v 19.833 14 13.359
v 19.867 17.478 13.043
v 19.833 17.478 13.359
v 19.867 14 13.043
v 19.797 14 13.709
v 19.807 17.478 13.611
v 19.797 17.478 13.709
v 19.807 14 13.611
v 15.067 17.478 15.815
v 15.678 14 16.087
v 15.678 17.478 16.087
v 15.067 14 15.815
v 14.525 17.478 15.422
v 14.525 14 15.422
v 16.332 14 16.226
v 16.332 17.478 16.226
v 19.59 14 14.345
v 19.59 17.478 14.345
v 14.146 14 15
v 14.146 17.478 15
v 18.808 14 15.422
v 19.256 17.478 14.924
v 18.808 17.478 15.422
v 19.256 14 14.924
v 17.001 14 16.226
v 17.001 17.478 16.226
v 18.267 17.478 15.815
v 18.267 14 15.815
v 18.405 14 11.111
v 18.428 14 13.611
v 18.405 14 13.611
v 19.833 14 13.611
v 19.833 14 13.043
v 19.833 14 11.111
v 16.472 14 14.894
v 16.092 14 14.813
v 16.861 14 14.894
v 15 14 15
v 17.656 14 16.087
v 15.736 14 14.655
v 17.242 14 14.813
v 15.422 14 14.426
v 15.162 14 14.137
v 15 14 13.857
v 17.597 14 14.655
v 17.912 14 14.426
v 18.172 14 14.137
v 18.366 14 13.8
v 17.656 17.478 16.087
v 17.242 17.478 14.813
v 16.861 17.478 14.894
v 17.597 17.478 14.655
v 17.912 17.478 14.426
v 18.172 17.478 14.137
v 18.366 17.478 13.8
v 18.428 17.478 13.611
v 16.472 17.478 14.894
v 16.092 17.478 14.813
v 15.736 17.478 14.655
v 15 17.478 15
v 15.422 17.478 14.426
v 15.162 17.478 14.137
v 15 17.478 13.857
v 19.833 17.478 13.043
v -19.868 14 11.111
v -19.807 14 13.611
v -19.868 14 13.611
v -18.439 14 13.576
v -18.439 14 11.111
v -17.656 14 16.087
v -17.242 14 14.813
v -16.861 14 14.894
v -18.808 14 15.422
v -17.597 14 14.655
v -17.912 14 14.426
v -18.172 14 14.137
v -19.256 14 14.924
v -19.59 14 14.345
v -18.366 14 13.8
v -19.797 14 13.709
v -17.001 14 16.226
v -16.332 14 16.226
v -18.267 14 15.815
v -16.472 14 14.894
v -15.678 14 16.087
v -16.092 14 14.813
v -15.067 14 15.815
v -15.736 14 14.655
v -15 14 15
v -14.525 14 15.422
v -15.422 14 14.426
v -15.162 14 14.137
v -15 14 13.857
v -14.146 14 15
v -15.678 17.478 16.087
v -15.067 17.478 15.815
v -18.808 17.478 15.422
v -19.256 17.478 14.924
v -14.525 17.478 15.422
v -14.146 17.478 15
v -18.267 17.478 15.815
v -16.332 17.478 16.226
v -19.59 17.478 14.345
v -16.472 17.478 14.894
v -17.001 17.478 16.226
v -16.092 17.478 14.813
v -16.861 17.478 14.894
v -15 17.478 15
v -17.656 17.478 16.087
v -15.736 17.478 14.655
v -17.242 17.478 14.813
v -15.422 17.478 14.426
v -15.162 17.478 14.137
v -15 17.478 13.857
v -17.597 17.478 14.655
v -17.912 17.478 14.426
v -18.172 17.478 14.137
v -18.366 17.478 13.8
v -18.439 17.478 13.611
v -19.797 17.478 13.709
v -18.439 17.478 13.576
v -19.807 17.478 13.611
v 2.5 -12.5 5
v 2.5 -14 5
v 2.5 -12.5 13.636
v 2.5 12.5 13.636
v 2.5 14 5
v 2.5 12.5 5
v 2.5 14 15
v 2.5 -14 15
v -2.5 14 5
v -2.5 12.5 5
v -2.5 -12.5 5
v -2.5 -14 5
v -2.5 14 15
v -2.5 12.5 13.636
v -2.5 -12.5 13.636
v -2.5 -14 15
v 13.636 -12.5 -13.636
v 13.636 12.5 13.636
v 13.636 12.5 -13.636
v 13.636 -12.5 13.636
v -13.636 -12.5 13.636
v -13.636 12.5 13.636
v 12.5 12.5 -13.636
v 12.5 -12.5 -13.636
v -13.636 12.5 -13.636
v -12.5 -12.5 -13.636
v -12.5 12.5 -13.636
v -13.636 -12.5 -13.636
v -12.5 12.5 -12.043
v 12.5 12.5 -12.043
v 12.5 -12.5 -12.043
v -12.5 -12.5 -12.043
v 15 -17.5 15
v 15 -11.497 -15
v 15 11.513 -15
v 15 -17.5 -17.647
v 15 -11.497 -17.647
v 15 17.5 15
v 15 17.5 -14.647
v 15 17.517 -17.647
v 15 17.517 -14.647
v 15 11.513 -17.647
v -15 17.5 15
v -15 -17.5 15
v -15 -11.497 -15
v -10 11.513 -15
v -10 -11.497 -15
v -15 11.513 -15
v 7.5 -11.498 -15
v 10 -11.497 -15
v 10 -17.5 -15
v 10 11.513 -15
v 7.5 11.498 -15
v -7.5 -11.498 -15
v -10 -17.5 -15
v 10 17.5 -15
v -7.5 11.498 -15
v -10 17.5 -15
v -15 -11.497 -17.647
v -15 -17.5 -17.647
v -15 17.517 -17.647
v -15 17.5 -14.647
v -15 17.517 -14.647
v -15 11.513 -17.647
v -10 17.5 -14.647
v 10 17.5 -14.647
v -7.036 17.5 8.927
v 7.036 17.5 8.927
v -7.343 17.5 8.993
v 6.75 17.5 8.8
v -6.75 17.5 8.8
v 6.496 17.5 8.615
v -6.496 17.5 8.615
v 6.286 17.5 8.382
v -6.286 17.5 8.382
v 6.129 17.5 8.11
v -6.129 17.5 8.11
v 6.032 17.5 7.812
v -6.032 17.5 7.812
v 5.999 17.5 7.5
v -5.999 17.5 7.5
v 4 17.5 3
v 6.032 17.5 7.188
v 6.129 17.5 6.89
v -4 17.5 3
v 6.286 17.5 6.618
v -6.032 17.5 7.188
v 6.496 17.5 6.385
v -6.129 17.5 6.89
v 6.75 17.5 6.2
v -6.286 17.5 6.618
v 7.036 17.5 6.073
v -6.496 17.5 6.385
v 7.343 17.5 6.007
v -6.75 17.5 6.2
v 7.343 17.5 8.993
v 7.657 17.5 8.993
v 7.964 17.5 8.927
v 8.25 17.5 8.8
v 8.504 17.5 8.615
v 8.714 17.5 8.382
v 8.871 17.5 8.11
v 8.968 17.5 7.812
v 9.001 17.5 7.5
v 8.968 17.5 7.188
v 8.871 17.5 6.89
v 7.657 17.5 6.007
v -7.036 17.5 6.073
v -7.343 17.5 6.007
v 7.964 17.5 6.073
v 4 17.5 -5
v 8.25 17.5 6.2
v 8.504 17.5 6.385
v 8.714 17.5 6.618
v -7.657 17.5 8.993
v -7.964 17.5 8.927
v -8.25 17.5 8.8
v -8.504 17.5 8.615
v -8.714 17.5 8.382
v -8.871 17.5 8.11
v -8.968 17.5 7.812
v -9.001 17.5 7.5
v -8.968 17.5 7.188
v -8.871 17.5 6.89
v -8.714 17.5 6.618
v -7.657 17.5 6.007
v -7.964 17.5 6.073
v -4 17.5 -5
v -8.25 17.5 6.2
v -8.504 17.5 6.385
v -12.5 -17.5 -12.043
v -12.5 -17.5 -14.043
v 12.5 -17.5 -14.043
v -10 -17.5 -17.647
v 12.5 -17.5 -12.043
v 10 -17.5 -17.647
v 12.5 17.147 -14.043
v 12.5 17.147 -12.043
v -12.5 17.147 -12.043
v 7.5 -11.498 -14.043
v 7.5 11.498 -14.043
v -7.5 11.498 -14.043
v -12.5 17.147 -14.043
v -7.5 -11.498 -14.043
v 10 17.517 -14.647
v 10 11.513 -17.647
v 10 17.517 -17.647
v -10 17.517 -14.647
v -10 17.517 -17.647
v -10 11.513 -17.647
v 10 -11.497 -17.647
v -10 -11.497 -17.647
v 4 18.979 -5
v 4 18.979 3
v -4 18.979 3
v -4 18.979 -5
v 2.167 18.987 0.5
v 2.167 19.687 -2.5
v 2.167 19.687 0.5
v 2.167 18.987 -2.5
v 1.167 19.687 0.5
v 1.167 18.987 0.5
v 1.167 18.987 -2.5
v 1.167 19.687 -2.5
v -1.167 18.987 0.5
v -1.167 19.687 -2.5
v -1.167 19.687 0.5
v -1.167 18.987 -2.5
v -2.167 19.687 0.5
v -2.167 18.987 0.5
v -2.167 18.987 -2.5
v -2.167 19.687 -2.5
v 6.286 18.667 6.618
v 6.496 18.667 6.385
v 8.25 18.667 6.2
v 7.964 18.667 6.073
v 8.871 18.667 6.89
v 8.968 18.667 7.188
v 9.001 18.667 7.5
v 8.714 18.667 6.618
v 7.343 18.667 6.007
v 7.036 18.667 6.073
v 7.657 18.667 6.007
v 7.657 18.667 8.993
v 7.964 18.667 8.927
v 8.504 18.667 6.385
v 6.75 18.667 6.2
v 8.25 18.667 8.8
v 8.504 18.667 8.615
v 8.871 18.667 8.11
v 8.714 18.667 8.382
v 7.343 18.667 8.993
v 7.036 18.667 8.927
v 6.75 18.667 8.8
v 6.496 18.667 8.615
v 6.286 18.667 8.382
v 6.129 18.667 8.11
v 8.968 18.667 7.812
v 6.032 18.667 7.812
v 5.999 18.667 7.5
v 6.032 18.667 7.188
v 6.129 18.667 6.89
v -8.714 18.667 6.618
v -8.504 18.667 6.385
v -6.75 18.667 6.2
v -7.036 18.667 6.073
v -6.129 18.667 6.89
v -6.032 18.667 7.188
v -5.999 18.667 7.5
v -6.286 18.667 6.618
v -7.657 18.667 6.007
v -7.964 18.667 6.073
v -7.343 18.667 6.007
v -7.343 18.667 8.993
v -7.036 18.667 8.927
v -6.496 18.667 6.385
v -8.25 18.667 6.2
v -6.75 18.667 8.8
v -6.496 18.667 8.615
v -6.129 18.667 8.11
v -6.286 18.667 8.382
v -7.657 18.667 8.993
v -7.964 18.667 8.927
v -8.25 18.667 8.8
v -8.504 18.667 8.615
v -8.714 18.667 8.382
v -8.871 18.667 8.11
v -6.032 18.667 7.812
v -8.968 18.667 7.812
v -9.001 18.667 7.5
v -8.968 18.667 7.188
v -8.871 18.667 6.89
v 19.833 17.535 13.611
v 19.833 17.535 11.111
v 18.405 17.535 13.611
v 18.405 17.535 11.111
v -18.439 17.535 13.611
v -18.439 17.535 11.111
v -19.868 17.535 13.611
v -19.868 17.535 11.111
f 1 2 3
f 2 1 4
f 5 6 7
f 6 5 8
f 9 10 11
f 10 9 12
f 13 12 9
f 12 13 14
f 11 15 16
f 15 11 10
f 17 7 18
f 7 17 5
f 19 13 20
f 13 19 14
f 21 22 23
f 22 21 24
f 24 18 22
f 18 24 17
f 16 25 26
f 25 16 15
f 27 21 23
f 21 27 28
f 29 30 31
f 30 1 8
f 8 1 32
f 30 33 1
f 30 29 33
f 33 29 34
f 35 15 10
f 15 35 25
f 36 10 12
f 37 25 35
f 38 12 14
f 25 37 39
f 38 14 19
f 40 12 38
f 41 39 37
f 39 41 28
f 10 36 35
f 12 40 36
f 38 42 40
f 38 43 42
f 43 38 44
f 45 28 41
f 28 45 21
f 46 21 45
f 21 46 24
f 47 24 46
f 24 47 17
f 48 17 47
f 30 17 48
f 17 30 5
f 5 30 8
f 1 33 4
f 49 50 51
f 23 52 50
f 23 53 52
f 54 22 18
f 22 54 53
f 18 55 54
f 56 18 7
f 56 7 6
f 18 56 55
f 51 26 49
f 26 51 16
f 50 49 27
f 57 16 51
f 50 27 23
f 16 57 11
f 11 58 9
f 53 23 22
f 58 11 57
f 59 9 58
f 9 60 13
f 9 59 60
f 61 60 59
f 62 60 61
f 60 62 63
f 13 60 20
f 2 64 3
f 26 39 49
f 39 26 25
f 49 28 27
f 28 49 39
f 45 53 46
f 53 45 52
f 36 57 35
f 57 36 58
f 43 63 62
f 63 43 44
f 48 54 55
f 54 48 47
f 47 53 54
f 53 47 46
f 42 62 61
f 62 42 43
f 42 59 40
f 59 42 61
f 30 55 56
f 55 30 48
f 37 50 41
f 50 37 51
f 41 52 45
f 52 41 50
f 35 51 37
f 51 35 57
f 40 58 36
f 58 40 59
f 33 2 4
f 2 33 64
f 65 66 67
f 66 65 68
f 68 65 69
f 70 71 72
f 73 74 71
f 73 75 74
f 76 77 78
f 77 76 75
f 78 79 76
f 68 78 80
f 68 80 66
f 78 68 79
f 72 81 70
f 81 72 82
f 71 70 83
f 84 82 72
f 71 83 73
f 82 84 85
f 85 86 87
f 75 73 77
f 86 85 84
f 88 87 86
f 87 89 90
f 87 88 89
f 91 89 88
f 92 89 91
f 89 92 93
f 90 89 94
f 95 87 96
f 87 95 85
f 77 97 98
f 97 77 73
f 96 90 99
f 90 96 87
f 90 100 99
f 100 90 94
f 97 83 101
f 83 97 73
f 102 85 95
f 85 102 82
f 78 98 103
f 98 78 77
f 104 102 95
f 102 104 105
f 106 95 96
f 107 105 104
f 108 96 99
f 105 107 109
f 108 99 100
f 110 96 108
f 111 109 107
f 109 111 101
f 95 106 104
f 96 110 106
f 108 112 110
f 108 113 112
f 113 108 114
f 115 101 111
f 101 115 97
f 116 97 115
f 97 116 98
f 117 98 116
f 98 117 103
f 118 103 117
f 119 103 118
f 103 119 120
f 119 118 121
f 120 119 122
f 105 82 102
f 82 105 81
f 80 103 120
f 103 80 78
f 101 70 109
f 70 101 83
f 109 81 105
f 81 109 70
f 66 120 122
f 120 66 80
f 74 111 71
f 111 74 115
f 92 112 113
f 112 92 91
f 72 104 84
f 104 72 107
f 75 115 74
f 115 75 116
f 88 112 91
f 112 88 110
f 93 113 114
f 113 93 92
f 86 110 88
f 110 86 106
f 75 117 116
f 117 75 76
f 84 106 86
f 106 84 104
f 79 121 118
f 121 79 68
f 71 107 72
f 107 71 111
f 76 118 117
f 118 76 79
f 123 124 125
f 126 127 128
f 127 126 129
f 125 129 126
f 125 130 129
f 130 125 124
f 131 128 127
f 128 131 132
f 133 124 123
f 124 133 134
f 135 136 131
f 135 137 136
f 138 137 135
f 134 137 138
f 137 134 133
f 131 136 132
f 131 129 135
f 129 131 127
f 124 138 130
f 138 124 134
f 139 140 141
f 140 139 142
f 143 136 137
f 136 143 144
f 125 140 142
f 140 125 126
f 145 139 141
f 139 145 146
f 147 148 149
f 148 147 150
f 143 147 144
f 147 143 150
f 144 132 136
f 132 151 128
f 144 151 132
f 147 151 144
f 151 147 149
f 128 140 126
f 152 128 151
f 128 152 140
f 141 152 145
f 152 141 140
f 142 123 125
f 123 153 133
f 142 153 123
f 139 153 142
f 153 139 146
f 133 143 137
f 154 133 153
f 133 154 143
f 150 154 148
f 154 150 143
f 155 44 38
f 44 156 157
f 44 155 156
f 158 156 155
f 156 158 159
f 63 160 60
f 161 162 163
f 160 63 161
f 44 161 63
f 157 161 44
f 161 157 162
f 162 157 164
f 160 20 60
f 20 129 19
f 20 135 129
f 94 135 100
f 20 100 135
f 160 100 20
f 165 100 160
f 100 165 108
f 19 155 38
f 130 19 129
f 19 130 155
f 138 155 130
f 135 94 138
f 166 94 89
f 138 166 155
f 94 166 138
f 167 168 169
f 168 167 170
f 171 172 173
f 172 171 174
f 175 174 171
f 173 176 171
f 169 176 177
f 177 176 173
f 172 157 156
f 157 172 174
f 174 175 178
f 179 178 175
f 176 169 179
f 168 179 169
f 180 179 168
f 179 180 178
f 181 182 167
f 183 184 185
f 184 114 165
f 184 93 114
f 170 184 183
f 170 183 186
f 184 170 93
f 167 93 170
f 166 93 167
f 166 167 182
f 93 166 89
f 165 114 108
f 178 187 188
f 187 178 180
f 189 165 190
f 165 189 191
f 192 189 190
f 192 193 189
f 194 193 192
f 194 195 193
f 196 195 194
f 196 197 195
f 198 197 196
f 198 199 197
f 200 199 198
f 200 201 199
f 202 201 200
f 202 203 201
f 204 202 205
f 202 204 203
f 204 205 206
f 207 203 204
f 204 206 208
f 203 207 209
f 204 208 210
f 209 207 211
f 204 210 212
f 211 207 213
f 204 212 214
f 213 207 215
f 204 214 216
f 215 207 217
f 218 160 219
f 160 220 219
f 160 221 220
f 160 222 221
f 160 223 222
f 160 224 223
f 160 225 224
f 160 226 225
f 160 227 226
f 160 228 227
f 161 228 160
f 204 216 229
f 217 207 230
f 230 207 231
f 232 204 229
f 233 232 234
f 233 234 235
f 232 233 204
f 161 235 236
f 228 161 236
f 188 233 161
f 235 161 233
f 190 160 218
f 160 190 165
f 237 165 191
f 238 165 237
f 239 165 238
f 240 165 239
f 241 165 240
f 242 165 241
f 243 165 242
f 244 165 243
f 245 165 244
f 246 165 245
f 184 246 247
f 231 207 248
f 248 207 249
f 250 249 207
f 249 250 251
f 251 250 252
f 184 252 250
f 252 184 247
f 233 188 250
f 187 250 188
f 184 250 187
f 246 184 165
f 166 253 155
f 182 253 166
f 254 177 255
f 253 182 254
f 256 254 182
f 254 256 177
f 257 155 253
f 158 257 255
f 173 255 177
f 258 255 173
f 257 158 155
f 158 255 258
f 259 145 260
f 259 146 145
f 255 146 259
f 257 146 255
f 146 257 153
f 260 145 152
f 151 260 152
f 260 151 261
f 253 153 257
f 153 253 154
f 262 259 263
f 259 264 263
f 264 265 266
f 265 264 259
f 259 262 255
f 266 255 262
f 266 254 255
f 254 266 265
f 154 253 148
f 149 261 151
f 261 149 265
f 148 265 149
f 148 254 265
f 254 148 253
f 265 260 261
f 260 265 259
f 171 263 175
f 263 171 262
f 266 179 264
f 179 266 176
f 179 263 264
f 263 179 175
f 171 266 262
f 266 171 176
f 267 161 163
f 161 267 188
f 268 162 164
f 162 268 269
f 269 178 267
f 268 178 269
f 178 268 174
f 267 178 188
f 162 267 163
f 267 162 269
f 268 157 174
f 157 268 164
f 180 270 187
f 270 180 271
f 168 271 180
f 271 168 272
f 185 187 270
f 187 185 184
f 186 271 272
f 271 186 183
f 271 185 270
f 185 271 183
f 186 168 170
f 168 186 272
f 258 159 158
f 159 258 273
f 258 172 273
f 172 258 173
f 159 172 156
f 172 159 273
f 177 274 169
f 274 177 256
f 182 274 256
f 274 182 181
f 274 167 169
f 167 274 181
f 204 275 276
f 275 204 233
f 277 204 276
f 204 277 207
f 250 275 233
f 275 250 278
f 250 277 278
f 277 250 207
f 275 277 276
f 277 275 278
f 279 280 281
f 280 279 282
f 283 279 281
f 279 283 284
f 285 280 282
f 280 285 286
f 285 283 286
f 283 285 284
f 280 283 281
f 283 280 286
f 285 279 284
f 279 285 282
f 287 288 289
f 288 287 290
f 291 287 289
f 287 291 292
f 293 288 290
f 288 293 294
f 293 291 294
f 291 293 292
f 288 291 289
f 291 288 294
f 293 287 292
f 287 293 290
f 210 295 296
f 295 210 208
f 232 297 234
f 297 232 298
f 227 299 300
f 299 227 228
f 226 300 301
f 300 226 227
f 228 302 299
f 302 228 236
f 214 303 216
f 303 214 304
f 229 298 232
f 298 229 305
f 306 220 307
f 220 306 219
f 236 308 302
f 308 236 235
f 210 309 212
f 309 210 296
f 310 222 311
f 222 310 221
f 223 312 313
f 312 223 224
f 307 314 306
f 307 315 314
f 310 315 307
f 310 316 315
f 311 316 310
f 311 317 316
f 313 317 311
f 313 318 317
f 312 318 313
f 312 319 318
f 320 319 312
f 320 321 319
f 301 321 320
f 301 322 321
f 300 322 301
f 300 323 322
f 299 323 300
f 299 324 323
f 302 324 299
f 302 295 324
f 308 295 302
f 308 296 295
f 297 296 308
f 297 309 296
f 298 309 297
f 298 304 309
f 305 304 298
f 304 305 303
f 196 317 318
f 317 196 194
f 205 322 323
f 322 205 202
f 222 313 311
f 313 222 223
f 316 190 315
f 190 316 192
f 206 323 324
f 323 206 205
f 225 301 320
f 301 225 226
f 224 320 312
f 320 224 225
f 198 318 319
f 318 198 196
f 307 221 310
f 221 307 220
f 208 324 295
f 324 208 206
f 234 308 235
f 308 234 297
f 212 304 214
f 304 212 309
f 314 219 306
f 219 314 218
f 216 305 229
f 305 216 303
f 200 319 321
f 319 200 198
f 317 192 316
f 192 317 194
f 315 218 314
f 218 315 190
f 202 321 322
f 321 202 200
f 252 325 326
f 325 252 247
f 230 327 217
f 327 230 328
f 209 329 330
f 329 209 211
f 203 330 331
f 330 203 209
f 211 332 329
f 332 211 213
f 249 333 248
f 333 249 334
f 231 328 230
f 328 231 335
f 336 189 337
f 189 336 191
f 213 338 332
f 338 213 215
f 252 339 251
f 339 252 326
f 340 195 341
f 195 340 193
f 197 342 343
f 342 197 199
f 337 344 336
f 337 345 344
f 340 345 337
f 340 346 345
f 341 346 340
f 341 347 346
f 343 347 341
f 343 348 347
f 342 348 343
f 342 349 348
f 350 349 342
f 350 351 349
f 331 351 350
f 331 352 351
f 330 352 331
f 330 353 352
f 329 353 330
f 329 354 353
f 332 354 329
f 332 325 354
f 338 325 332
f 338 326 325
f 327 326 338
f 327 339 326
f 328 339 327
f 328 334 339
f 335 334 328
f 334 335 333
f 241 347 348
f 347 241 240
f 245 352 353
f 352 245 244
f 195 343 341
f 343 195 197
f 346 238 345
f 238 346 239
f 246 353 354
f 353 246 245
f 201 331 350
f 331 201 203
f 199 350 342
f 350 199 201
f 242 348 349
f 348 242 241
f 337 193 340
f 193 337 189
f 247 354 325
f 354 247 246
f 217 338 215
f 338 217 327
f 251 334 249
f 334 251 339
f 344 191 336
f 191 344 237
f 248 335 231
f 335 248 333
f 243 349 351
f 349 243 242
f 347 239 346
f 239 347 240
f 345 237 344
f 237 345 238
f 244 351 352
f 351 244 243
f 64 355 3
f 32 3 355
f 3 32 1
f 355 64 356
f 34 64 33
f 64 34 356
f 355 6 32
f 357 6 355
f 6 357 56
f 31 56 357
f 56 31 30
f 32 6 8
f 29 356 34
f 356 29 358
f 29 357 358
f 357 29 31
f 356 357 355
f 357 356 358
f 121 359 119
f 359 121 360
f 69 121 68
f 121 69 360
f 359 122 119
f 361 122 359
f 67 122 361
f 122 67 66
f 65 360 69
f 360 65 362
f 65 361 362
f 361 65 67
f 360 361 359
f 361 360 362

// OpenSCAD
$fn=30;
width=30;
depth=35;
height=30;
diameter=8;
//
//jambe
//
translate([width/3,depth/3.04,-height/1.7])cube([width/6,depth/5.83,height/10]);
translate([-width/2,depth/3.04,-height/1.7])cube([width/6,depth/5.83,height/10]);
translate([width/3,-depth/2,-height/1.7])cube([width/6,depth/5.83,height/10]);
translate([-width/2,-depth/2,-height/1.7])cube([width/6,depth/5.83,height/10]);
//
//nez
//
translate([0,depth/1.92,height/6-6])cube([width/3.75,depth/23.33,height/3.75],center=true);
//
//narine
//
translate([width/18,depth/1.81,height/6-6])cube([width/30,depth/50,height/10],center=true);
translate([-width/18,depth/1.81,height/6-6])cube([width/30,depth/50,height/10],center=true);
//
//yeux
//
translate([width/4,depth/2.1,height/4])rotate([270,0,0])cylinder(h=diameter/4,r=diameter/5.33);
translate([-width/4,depth/2.1,height/4])rotate([270,0,0])cylinder(h=diameter/4,r=diameter/5.33);
//
//oreille
//
translate([width/1.63,depth/2.5,height/2.7])cube([width/21,depth/9.9,height/12]);
intersection()
{
difference()
{
translate([width/1.8,depth/2.5,height/2.3])rotate([270,0,0])cylinder(h=diameter/2.3,r=diameter/2.5);
translate([width/1.8,depth/2.5,height/2.3])rotate([270,0,0])cylinder(h=diameter/2.3,r=diameter/4.3);
}
translate([width/2.5,depth/2.7,height/2.3])cube([width/3,depth/7,height/2.5]);
}
//
//oreille 2
//
translate([-width/1.51,depth/2.5,height/2.7])cube([width/21,depth/9.9,height/12]);
intersection()
{
difference()
{
translate([-width/1.8,depth/2.5,height/2.3])rotate([270,0,0])cylinder(h=diameter/2.3,r=diameter/2.5);
translate([-width/1.8,depth/2.5,height/2.3])rotate([270,0,0])cylinder(h=diameter/2.3,r=diameter/4.3);
}
translate([-width/1.4,depth/2.7,height/2.3])cube([width/3,depth/7,height/2.5]);
}
//
//trous pour argent
//
difference()
{
cube([width,depth,height],center=true);
union() {
translate([0,0,height/1.5])cube([width/6,depth/1.25,height],center=true);
cube([width/1.1,depth/1.4,height/1.1],center=true);
}
translate([0,-depth/8-2,-height/2.3])cube([width/1.2,depth/0.744,height/15],center=true);
translate([0,0,-height/2])cube([width/2,depth/1.522,height/1.25],center=true);
}
